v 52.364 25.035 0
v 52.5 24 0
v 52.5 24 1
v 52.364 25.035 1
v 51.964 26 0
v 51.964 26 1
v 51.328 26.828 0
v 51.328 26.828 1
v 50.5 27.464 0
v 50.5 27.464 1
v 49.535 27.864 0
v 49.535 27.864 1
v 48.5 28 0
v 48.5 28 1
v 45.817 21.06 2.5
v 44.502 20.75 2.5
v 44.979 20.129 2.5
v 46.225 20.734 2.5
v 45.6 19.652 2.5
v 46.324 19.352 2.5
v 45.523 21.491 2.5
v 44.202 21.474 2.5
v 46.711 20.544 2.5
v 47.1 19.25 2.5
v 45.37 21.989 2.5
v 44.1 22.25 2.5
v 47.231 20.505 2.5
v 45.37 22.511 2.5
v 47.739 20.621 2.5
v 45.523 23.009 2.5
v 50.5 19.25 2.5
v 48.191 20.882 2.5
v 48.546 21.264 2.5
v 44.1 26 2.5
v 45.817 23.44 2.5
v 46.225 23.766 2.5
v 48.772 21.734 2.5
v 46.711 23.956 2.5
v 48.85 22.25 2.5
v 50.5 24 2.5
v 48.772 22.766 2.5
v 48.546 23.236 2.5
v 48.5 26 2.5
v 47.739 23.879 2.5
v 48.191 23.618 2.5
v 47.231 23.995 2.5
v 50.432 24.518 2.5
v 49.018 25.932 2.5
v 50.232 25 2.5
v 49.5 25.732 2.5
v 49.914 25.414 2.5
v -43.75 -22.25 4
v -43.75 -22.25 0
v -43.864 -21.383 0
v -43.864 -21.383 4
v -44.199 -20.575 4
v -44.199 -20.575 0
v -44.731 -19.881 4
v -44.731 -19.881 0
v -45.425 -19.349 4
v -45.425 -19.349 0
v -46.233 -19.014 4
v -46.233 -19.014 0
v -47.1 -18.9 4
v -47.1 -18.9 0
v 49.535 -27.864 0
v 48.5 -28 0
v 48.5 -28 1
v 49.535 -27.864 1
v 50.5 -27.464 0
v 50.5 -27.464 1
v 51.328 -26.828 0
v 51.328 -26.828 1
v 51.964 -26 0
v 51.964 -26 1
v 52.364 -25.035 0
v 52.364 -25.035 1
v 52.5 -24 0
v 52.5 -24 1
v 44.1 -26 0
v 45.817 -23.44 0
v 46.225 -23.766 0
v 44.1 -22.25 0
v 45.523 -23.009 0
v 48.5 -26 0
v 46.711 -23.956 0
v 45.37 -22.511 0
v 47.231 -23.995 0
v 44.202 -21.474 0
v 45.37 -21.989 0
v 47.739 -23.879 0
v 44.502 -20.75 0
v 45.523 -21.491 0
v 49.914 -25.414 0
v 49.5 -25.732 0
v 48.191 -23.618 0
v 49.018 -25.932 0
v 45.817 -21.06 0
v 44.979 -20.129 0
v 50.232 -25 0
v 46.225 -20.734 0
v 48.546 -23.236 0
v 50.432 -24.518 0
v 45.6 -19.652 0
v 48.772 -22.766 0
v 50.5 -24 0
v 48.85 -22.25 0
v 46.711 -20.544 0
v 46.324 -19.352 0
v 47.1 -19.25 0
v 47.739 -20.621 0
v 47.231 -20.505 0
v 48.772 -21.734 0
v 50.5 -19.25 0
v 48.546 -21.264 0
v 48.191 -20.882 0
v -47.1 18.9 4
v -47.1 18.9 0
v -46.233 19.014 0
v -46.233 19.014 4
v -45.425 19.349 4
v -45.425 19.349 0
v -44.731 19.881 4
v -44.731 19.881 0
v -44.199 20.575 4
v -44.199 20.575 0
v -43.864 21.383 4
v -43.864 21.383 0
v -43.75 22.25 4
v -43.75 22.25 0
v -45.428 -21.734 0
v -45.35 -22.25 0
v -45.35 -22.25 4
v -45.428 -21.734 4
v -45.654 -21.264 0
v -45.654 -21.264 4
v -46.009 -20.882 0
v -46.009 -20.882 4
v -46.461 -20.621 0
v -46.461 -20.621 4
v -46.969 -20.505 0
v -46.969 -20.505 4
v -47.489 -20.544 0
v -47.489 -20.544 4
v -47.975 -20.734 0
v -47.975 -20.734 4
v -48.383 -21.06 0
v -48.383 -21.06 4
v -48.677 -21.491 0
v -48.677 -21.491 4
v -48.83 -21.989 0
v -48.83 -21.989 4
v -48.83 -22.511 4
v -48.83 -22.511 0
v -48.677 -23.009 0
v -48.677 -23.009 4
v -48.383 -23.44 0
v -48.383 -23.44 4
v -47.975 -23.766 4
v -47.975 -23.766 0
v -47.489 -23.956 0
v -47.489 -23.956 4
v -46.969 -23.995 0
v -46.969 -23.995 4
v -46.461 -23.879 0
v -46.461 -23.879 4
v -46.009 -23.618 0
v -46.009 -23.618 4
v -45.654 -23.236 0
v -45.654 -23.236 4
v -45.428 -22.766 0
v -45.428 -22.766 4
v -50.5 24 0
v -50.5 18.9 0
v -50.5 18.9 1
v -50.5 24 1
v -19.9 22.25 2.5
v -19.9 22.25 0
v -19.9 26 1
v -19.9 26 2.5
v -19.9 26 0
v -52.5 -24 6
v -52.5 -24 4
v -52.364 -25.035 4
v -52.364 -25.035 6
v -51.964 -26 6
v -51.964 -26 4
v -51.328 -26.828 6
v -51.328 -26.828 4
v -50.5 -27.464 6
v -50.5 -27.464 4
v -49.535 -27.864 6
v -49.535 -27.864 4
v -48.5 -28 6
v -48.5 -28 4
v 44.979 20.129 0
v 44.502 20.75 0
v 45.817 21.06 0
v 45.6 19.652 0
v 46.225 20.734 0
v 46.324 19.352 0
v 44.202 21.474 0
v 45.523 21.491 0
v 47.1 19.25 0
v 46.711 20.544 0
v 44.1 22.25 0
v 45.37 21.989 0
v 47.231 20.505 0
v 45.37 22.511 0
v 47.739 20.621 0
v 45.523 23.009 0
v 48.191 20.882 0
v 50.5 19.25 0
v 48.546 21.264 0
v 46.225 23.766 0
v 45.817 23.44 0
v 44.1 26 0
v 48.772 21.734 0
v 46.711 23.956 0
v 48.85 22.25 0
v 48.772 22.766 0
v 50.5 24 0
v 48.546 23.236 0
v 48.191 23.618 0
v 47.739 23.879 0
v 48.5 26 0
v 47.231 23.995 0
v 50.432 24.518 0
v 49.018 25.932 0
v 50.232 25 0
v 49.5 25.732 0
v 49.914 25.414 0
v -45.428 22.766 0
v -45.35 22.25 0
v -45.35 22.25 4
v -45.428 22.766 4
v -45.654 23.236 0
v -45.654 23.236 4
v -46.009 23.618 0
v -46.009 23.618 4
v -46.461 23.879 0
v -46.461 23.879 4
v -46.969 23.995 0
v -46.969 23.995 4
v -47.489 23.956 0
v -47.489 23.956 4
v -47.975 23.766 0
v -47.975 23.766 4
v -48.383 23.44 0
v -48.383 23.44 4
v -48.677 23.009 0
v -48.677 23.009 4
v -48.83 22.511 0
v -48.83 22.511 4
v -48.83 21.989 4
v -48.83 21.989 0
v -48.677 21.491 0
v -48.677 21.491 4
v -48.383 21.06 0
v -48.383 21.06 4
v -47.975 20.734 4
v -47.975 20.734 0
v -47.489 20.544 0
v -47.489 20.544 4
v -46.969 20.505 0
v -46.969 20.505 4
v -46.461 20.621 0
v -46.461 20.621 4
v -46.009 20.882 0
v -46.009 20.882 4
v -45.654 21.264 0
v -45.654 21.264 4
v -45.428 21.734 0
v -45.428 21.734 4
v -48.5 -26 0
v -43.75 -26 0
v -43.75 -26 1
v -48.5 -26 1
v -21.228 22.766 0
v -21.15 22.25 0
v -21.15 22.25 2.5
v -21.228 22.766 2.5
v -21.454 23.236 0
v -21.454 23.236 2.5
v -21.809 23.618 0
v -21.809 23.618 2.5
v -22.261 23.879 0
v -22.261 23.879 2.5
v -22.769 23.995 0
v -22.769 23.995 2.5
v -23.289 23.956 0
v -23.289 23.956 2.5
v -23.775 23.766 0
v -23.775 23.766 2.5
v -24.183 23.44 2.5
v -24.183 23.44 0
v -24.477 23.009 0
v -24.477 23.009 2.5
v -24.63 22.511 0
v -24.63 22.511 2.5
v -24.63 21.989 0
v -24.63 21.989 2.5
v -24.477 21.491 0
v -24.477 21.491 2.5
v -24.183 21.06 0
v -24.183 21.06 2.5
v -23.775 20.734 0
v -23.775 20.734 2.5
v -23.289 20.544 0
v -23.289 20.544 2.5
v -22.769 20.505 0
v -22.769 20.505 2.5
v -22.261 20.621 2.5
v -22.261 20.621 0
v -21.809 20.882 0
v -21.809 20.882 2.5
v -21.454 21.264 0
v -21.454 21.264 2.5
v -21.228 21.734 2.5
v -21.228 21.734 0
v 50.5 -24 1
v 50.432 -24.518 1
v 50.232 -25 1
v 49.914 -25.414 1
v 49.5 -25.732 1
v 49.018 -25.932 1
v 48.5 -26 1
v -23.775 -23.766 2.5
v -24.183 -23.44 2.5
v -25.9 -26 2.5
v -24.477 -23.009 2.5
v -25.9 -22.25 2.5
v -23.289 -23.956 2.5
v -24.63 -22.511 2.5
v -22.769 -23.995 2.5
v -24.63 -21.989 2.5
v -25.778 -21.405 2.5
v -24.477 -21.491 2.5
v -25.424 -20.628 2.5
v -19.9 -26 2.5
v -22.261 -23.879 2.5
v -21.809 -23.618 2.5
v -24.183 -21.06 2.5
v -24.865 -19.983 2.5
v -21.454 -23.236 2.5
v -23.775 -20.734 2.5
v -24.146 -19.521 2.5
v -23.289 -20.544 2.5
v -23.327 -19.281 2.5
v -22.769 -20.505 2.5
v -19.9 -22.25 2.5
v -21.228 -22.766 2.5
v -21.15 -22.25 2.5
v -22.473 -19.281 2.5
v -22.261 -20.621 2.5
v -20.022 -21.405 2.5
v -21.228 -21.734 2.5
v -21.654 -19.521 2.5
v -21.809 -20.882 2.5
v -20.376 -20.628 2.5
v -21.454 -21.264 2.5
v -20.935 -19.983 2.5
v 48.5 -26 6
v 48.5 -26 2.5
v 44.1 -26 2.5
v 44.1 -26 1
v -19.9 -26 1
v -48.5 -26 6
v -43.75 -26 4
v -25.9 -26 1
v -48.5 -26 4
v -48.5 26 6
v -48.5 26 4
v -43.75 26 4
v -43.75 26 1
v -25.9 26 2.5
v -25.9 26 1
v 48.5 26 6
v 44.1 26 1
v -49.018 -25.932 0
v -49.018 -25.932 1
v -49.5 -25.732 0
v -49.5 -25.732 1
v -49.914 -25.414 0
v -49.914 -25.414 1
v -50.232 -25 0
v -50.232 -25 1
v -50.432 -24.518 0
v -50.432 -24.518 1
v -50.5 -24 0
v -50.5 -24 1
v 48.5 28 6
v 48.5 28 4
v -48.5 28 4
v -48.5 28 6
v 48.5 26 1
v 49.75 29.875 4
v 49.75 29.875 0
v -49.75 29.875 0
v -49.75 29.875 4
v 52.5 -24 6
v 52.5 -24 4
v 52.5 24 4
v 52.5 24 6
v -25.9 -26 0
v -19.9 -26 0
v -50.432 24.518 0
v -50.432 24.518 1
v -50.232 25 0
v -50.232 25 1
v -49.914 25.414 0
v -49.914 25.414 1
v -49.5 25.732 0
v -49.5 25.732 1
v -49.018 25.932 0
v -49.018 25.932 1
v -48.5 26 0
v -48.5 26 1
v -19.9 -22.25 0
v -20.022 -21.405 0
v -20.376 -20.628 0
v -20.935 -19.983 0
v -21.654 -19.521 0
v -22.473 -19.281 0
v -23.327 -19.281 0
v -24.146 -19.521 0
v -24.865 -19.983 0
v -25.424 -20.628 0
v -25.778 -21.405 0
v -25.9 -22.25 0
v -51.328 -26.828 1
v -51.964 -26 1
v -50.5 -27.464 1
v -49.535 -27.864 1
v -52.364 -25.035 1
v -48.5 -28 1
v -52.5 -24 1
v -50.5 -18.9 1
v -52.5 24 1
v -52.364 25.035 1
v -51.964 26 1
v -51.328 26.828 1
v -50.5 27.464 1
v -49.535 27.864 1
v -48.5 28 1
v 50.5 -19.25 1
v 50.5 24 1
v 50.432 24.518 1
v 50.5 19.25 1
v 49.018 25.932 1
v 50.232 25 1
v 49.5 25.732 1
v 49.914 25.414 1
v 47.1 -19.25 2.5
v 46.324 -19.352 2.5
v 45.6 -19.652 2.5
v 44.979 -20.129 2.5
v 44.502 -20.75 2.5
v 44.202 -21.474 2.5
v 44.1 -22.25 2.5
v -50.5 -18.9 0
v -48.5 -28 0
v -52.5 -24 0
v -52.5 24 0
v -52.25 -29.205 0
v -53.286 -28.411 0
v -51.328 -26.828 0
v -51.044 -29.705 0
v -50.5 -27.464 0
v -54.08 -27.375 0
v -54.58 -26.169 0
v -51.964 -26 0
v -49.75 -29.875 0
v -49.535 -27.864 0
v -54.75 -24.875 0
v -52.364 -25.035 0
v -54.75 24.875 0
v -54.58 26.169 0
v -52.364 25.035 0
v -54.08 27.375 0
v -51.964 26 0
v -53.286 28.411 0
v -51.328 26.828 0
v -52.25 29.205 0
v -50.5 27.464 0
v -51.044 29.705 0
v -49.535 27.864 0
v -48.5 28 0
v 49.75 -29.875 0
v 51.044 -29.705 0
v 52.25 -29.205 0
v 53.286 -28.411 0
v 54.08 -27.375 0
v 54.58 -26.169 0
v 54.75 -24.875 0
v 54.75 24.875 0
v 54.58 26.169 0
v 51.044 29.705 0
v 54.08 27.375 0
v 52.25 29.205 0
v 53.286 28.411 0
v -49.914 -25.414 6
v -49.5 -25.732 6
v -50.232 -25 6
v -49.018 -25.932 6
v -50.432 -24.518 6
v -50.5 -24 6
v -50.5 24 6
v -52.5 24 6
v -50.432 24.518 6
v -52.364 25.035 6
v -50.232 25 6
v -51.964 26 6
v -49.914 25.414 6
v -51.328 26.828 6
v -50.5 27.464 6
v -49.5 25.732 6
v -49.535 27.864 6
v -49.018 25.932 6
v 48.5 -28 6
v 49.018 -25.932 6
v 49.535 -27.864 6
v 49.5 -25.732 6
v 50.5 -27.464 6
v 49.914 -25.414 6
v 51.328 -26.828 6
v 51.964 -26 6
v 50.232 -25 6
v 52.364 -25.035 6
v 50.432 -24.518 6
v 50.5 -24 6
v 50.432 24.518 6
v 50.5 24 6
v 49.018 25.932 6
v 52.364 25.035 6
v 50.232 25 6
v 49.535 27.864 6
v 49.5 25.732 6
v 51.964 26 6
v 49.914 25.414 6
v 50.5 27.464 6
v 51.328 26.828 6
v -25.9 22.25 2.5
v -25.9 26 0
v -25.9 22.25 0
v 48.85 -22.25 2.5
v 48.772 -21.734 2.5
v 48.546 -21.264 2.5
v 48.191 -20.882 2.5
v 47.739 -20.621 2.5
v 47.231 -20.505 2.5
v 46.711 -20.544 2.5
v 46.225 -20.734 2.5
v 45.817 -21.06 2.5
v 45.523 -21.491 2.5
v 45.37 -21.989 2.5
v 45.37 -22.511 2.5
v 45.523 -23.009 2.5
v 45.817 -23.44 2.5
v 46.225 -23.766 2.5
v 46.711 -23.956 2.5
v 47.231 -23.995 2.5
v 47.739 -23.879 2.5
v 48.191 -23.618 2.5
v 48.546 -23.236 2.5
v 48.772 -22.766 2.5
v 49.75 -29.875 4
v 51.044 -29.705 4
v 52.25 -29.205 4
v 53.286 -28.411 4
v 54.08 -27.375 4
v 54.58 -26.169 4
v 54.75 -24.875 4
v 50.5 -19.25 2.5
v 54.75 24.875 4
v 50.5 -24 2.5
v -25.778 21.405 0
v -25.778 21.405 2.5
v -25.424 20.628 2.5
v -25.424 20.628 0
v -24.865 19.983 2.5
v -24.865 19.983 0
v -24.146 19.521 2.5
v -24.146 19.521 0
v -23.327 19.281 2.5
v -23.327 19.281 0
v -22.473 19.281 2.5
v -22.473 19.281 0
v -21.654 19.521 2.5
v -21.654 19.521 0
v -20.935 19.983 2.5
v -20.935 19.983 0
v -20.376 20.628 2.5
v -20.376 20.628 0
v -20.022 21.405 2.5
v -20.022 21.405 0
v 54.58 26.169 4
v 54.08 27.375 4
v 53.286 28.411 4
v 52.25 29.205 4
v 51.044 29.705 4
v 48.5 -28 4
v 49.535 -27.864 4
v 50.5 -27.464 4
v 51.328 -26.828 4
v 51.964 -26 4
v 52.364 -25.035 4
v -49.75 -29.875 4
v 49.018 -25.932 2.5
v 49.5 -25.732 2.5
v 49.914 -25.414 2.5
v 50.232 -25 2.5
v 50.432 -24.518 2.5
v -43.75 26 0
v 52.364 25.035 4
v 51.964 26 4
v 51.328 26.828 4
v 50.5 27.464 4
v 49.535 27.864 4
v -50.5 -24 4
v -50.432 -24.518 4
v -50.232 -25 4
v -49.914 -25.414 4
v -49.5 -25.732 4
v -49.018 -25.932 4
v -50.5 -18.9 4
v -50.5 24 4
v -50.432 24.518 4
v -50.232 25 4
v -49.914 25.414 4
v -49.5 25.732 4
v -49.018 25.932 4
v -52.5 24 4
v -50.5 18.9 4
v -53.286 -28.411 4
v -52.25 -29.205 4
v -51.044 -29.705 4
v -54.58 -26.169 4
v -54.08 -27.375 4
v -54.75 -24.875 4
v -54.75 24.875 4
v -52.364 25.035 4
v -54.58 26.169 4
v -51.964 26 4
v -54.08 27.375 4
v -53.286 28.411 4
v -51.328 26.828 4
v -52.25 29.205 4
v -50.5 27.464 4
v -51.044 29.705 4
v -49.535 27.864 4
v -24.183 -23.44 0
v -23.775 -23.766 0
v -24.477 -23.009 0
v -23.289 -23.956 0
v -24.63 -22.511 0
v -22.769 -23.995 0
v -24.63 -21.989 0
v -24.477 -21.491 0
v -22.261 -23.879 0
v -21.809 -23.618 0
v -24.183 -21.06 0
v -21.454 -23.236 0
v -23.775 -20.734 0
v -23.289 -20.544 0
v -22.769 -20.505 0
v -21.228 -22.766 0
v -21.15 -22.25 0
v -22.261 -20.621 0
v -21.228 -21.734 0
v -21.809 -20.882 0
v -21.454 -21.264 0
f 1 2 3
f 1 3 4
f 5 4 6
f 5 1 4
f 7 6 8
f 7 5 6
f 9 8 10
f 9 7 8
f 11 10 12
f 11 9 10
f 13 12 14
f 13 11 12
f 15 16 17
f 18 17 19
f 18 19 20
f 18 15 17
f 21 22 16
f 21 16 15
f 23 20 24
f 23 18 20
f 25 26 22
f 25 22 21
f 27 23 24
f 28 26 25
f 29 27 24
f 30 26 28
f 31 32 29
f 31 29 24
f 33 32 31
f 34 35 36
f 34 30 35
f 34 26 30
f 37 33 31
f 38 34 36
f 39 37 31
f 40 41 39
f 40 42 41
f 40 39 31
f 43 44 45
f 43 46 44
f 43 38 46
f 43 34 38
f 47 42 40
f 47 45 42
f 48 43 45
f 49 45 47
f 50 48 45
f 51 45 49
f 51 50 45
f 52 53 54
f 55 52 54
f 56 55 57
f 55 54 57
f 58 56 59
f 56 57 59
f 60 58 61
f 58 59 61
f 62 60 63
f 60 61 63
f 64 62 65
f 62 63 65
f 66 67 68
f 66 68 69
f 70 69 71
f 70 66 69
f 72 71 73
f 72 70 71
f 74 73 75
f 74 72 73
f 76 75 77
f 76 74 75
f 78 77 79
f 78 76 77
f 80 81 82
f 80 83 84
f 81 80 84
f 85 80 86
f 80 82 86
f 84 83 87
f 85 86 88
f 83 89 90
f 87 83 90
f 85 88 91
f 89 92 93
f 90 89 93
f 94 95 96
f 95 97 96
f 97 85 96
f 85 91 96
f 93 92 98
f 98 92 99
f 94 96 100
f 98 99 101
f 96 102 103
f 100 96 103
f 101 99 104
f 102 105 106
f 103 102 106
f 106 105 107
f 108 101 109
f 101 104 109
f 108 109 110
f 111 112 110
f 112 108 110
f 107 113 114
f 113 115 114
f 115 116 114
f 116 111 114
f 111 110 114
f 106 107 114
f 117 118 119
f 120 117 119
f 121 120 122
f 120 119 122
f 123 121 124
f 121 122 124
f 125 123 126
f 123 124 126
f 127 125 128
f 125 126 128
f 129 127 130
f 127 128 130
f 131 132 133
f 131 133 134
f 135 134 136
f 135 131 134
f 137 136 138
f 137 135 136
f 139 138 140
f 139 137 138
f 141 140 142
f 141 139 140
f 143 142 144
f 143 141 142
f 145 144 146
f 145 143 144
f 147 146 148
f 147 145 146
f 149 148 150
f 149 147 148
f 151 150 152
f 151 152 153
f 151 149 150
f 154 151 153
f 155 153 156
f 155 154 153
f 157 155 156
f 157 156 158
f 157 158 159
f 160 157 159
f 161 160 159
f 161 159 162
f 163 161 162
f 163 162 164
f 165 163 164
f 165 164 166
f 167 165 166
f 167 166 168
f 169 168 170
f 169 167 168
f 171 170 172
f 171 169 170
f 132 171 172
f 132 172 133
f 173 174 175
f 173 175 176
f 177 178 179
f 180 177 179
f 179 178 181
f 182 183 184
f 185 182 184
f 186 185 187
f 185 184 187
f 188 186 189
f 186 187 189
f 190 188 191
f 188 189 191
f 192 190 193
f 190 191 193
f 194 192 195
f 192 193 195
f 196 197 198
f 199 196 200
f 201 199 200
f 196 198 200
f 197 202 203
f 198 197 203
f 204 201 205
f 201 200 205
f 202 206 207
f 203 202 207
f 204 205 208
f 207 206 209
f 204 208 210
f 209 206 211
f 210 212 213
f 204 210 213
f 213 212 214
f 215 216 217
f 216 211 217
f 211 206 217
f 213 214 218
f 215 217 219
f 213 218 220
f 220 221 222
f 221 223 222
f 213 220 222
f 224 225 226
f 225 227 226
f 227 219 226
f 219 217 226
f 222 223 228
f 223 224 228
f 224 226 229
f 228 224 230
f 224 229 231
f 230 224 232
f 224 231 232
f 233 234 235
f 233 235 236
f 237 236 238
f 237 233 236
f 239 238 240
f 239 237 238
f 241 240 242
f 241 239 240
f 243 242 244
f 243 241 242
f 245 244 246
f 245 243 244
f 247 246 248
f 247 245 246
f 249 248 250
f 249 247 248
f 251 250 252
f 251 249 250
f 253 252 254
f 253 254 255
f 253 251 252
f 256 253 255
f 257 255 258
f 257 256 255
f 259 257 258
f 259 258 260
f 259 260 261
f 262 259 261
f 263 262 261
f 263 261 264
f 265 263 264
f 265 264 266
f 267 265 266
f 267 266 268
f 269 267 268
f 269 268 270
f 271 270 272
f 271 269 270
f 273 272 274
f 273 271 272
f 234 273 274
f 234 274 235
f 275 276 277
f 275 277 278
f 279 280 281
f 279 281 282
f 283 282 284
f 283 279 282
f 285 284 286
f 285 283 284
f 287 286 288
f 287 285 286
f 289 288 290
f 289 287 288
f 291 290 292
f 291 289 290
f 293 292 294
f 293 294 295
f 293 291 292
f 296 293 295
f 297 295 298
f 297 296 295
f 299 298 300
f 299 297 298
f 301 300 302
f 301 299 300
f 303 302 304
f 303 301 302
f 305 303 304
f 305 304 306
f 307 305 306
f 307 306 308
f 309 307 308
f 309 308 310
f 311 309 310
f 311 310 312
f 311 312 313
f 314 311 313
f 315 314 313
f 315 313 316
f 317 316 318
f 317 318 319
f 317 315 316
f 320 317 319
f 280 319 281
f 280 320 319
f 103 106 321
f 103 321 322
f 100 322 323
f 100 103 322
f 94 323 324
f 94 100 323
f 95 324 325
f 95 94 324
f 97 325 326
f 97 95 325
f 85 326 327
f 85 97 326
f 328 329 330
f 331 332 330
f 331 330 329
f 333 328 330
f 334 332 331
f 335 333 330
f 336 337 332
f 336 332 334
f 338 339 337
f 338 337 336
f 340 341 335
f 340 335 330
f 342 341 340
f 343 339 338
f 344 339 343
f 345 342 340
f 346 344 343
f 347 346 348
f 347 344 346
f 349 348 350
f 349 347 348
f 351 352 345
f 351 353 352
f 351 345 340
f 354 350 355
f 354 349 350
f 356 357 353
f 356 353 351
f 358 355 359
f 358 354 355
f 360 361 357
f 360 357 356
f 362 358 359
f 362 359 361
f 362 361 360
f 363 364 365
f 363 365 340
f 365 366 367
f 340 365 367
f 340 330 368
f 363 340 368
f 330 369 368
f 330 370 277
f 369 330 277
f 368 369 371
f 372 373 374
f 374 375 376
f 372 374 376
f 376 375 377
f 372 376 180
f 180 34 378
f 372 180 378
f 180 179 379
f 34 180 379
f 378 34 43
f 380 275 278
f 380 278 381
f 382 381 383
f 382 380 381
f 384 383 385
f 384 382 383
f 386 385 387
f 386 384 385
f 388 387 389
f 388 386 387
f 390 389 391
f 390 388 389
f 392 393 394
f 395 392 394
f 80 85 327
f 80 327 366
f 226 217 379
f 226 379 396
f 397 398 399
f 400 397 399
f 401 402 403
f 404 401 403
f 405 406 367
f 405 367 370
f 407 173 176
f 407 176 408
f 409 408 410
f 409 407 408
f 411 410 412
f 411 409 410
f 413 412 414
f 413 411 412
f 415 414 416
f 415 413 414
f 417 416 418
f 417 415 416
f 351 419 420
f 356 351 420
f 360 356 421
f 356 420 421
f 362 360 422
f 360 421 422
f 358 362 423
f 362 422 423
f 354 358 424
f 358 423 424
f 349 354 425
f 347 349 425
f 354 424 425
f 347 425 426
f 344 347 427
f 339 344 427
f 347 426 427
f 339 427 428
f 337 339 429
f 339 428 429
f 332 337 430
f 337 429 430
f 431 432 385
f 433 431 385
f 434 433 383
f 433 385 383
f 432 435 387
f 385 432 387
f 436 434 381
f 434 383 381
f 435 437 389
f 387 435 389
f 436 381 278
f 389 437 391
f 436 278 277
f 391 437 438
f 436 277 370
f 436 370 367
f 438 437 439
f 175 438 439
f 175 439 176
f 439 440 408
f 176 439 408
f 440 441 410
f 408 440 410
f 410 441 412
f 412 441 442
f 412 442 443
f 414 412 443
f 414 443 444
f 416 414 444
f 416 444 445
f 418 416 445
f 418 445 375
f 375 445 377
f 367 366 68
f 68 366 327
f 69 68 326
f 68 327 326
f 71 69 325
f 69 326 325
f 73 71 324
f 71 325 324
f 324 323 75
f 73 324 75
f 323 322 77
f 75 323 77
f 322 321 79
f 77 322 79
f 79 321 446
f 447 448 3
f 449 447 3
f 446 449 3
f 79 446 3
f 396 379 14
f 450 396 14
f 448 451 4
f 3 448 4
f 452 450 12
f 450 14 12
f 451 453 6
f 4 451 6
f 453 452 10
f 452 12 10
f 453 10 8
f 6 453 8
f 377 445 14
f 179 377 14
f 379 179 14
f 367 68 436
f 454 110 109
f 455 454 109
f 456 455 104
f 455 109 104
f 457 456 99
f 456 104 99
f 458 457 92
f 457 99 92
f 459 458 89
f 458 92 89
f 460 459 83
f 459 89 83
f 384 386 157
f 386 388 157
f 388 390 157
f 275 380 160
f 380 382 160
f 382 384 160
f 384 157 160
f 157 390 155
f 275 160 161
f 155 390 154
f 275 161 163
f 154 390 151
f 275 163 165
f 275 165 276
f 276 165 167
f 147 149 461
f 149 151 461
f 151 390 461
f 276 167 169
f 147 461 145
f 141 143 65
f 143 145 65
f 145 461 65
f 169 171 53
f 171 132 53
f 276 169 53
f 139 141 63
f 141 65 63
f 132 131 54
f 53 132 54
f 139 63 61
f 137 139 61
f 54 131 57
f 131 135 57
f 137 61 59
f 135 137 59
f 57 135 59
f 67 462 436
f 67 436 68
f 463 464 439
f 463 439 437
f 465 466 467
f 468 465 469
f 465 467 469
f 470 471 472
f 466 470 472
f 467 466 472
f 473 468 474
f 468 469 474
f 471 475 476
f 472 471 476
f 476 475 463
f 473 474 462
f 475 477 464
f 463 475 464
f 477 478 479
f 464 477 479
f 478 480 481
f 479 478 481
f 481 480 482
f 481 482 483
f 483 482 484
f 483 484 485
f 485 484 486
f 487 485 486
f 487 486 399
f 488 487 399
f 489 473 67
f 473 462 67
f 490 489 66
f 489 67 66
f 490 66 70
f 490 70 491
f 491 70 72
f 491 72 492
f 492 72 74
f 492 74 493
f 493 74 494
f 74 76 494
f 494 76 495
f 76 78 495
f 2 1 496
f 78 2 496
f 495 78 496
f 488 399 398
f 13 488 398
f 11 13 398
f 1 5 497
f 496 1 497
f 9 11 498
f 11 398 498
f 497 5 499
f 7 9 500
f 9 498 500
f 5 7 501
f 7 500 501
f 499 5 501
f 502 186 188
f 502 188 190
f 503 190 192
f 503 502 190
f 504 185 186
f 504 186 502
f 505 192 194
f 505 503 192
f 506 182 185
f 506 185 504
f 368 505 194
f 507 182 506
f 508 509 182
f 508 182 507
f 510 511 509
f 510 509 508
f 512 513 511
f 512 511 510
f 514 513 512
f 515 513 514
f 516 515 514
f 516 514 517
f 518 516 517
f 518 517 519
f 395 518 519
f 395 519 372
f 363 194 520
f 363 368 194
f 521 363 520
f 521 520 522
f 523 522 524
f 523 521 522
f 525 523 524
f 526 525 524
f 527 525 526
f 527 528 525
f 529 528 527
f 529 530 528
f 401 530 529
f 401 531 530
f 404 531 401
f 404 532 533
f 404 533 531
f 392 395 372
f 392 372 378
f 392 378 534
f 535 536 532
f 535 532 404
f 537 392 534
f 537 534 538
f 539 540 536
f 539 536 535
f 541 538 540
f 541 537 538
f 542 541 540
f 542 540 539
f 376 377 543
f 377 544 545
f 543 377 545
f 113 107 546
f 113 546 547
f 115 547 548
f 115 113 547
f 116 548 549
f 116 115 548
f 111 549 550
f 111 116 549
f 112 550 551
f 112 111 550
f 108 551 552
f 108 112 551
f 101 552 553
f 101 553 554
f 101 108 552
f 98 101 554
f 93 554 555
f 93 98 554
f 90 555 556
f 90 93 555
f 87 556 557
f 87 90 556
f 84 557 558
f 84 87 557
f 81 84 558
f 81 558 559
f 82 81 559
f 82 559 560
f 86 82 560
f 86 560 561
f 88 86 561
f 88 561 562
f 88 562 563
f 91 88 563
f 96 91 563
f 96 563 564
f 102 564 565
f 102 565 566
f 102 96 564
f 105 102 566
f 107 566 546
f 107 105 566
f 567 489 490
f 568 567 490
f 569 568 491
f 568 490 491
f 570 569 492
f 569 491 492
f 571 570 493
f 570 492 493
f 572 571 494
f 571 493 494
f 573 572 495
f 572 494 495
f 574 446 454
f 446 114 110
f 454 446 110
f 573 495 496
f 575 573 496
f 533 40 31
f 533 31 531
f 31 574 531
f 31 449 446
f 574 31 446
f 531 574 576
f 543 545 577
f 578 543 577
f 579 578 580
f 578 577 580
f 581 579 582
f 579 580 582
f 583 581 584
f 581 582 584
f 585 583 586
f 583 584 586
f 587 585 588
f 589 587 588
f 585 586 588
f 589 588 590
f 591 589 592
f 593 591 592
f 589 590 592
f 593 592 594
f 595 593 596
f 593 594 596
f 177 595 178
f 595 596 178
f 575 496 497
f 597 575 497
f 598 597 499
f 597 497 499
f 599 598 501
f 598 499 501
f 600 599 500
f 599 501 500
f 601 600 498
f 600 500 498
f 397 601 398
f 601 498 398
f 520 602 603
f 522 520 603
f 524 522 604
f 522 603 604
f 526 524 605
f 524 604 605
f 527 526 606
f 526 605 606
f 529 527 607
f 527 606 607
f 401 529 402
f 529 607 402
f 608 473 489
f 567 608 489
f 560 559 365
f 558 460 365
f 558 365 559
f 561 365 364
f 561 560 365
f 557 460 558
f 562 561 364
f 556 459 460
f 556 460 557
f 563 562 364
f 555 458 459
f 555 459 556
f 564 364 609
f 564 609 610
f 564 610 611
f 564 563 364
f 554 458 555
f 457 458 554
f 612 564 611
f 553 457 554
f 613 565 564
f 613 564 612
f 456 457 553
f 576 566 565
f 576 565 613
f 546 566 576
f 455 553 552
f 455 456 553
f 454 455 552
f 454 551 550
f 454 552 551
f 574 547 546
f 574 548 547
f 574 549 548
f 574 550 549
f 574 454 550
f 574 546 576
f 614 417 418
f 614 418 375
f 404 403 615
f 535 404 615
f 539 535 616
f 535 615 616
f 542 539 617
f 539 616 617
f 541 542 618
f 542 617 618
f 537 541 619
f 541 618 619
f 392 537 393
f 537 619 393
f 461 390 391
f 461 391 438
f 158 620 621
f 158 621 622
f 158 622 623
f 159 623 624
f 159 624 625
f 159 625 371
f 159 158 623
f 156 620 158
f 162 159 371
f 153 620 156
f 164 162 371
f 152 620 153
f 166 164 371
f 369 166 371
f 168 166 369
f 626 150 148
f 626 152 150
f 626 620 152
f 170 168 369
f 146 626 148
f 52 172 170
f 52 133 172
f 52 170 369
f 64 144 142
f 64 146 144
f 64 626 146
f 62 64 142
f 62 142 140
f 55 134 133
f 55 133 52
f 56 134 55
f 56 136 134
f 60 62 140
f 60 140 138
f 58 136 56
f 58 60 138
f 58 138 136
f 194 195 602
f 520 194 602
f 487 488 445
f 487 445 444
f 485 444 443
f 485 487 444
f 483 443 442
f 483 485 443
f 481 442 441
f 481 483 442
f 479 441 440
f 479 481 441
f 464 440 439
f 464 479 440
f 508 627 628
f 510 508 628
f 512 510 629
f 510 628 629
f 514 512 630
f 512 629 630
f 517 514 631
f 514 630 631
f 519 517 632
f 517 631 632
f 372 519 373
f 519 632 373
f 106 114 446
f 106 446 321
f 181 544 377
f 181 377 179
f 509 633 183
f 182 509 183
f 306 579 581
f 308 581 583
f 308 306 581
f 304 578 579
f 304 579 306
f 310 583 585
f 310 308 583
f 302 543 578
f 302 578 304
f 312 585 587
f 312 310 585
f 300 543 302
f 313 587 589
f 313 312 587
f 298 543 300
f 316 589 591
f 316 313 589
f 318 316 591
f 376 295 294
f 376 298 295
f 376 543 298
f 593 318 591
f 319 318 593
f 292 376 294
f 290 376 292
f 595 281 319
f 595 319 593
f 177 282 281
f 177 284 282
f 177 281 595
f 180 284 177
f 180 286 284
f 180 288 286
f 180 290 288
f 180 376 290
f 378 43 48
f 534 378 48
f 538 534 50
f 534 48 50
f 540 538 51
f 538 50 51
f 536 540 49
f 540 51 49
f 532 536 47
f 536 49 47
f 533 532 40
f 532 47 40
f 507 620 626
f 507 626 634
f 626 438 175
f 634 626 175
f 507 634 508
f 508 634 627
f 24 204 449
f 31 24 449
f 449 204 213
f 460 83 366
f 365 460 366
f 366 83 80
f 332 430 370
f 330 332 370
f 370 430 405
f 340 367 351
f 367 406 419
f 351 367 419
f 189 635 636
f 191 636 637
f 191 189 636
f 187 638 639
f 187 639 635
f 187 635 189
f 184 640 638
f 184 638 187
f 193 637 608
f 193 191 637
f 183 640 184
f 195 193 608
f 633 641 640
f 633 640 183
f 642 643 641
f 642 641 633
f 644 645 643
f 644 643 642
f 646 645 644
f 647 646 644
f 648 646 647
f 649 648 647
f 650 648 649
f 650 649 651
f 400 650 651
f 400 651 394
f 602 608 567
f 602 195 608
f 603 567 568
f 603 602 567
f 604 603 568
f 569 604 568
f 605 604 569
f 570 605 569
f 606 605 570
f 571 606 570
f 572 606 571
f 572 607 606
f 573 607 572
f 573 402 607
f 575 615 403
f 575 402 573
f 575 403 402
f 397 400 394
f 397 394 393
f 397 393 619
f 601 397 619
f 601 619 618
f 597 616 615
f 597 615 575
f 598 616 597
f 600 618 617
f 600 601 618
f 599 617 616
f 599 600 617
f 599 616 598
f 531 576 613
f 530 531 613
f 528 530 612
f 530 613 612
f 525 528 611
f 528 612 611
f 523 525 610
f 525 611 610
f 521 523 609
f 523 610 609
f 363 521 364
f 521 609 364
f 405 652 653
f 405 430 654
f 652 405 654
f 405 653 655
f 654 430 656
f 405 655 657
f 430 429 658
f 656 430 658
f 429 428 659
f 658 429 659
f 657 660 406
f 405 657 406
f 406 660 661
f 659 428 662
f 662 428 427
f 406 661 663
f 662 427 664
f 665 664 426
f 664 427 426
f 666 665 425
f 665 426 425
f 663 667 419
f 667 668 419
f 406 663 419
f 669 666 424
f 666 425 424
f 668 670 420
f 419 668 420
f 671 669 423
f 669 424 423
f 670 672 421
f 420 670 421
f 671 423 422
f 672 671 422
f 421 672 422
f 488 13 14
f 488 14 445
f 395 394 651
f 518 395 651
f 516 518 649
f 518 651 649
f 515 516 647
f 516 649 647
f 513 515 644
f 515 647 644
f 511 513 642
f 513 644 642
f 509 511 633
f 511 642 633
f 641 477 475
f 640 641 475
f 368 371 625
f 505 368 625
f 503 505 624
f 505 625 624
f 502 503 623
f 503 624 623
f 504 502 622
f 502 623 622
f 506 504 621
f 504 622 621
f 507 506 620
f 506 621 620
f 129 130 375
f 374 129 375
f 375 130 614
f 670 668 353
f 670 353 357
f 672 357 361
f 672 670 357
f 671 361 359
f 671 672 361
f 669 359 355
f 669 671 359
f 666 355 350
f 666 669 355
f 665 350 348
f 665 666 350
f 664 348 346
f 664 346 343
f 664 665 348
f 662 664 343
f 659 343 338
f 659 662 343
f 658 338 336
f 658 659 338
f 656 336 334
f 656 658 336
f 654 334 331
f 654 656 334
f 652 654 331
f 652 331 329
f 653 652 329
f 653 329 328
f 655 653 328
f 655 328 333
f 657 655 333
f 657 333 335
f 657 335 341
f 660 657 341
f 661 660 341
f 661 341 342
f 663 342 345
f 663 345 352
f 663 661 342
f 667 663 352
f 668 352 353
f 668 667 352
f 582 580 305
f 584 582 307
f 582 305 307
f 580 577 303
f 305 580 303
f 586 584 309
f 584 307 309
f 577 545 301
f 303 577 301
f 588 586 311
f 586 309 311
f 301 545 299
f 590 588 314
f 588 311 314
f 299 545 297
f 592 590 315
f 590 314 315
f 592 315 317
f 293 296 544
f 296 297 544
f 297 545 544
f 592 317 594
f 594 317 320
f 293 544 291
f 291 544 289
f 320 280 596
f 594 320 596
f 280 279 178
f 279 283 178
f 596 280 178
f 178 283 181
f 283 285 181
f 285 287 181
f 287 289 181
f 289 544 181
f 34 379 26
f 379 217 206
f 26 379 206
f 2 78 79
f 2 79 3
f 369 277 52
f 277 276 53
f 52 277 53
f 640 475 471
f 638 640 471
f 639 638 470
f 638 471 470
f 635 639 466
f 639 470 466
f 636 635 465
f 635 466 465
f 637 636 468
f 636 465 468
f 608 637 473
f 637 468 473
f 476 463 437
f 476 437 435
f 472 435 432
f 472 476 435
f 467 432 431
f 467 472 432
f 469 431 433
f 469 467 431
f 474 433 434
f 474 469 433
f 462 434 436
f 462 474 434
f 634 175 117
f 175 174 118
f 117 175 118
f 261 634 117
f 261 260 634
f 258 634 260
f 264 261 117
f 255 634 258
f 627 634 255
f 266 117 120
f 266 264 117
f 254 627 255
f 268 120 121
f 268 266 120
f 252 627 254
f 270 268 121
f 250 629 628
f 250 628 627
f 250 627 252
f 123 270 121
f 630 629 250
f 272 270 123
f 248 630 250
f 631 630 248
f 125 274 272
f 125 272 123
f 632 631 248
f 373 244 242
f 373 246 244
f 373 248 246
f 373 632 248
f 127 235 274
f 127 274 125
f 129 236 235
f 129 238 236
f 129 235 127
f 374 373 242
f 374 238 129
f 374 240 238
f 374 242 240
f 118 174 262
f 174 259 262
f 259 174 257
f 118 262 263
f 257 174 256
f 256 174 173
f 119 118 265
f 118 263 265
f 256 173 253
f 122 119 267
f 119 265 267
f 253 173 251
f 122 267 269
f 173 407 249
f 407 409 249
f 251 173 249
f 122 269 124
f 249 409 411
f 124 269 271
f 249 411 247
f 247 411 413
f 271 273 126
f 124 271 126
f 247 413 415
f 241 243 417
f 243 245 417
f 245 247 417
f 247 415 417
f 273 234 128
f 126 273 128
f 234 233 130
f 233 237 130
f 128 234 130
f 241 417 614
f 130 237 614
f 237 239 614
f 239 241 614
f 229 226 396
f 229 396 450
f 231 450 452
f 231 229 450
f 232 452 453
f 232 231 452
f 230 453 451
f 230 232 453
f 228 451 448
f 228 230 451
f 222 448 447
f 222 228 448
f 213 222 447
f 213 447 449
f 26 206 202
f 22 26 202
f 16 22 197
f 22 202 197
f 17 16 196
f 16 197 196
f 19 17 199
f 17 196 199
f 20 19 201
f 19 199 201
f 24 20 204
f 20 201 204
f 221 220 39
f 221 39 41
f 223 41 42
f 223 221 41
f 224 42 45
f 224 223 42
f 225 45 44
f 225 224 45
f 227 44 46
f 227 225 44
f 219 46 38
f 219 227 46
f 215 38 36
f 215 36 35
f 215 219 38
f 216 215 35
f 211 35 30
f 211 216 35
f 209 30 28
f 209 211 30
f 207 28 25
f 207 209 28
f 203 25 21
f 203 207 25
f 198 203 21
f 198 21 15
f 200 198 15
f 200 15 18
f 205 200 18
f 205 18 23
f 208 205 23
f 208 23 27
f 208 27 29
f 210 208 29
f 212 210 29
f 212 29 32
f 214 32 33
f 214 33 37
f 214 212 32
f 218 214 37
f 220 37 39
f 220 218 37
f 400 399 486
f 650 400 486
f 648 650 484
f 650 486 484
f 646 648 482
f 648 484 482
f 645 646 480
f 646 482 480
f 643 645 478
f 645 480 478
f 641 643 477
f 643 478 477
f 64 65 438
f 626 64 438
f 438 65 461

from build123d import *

# Parameters (mm, degrees)
F1_DEPTH = 6
F2_DEPTH = 4
F0_R     = 1.75
F3_DEPTH = 2.5
F4_DEPTH = 4
F5_DEPTH = 1


with BuildPart() as f1:
    # F0 (on Top) → F1 (new body)
    with BuildSketch(Plane.XY):
        with BuildLine():
            Line((48.5, 28), (-48.5, 28))
            ThreePointArc((-48.5, 28), (-51.328427, 26.828427), (-52.5, 24))
            Line((-52.5, 24), (-52.5, -24))
            ThreePointArc((-52.5, -24), (-51.328427, -26.828427), (-48.5, -28))
            Line((-48.5, -28), (48.5, -28))
            ThreePointArc((48.5, -28), (51.328427, -26.828427), (52.5, -24))
            Line((52.5, -24), (52.5, 24))
            ThreePointArc((52.5, 24), (51.328427, 26.828427), (48.5, 28))
        make_face()
        with BuildLine():
            ThreePointArc((-50.5, 24), (-49.914214, 25.414214), (-48.5, 26))
            Line((-48.5, 26), (-43.75, 26))
            Line((-43.75, 26), (-25.9, 26))
            Line((-25.9, 26), (-19.9, 26))
            Line((-19.9, 26), (44.1, 26))
            Line((44.1, 26), (48.5, 26))
            ThreePointArc((48.5, 26), (49.914214, 25.414214), (50.5, 24))
            Line((50.5, 24), (50.5, 19.25))
            Line((50.5, 19.25), (50.5, -19.25))
            Line((50.5, -19.25), (50.5, -24))
            ThreePointArc((50.5, -24), (49.914214, -25.414214), (48.5, -26))
            Line((48.5, -26), (44.1, -26))
            Line((44.1, -26), (-19.9, -26))
            Line((-19.9, -26), (-25.9, -26))
            Line((-25.9, -26), (-43.75, -26))
            Line((-43.75, -26), (-48.5, -26))
            ThreePointArc((-48.5, -26), (-49.914214, -25.414214), (-50.5, -24))
            Line((-50.5, -24), (-50.5, -18.9))
            Line((-50.5, -18.9), (-50.5, 18.9))
            Line((-50.5, 18.9), (-50.5, 24))
        make_face(mode=Mode.SUBTRACT)
    extrude(amount=F1_DEPTH)

    # F0 (on Top) → F2 (join)
    with BuildSketch(Plane.XY):
        with BuildLine():
            Line((49.75, 29.875), (-49.75, 29.875))
            ThreePointArc((-49.75, 29.875), (-53.285534, 28.410534), (-54.75, 24.875))
            Line((-54.75, 24.875), (-54.75, -24.875))
            ThreePointArc((-54.75, -24.875), (-53.285534, -28.410534), (-49.75, -29.875))
            Line((-49.75, -29.875), (49.75, -29.875))
            ThreePointArc((49.75, -29.875), (53.285534, -28.410534), (54.75, -24.875))
            Line((54.75, -24.875), (54.75, 24.875))
            ThreePointArc((54.75, 24.875), (53.285534, 28.410534), (49.75, 29.875))
        make_face()
        with BuildLine():
            ThreePointArc((-52.5, 24), (-51.328427, 26.828427), (-48.5, 28))
            Line((-48.5, 28), (48.5, 28))
            ThreePointArc((48.5, 28), (51.328427, 26.828427), (52.5, 24))
            Line((52.5, 24), (52.5, -24))
            ThreePointArc((52.5, -24), (51.328427, -26.828427), (48.5, -28))
            Line((48.5, -28), (-48.5, -28))
            ThreePointArc((-48.5, -28), (-51.328427, -26.828427), (-52.5, -24))
            Line((-52.5, -24), (-52.5, 24))
        make_face(mode=Mode.SUBTRACT)
    extrude(amount=F2_DEPTH)

    # F0 (on Top) → F3 (join)
    with BuildSketch(Plane.XY):
        with BuildLine():
            Line((-19.9, 26), (-25.9, 26))
            Line((-25.9, 26), (-25.9, 22.25))
            ThreePointArc((-25.9, 22.25), (-22.9, 19.25), (-19.9, 22.25))
            Line((-19.9, 22.25), (-19.9, 26))
        make_face()
        with Locations((-22.9, 22.25)):
            Circle(F0_R, mode=Mode.SUBTRACT)
        with BuildLine():
            Line((48.5, 26), (44.1, 26))
            Line((44.1, 26), (44.1, 22.25))
            ThreePointArc((44.1, 22.25), (44.97868, 20.12868), (47.1, 19.25))
            Line((47.1, 19.25), (50.5, 19.25))
            Line((50.5, 19.25), (50.5, 24))
            ThreePointArc((50.5, 24), (49.914214, 25.414214), (48.5, 26))
        make_face()
        with Locations((47.1, 22.25)):
            Circle(F0_R, mode=Mode.SUBTRACT)
        with BuildLine():
            Line((50.5, -24), (50.5, -19.25))
            Line((50.5, -19.25), (47.1, -19.25))
            ThreePointArc((47.1, -19.25), (44.97868, -20.12868), (44.1, -22.25))
            Line((44.1, -22.25), (44.1, -26))
            Line((44.1, -26), (48.5, -26))
            ThreePointArc((48.5, -26), (49.914214, -25.414214), (50.5, -24))
        make_face()
        with Locations((47.1, -22.25)):
            Circle(F0_R, mode=Mode.SUBTRACT)
        with BuildLine():
            Line((-25.9, -22.25), (-25.9, -26))
            Line((-25.9, -26), (-19.9, -26))
            Line((-19.9, -26), (-19.9, -22.25))
            ThreePointArc((-19.9, -22.25), (-22.9, -19.25), (-25.9, -22.25))
        make_face()
        with Locations((-22.9, -22.25)):
            Circle(F0_R, mode=Mode.SUBTRACT)
    extrude(amount=F3_DEPTH)

    # F0 (on Top) → F4 (join)
    with BuildSketch(Plane.XY):
        with BuildLine():
            Line((-43.75, 26), (-48.5, 26))
            ThreePointArc((-48.5, 26), (-49.914214, 25.414214), (-50.5, 24))
            Line((-50.5, 24), (-50.5, 18.9))
            Line((-50.5, 18.9), (-47.1, 18.9))
            ThreePointArc((-47.1, 18.9), (-44.731192, 19.881192), (-43.75, 22.25))
            Line((-43.75, 22.25), (-43.75, 26))
        make_face()
        with Locations((-47.1, 22.25)):
            Circle(F0_R, mode=Mode.SUBTRACT)
        with BuildLine():
            Line((-47.1, -18.9), (-50.5, -18.9))
            Line((-50.5, -18.9), (-50.5, -24))
            ThreePointArc((-50.5, -24), (-49.914214, -25.414214), (-48.5, -26))
            Line((-48.5, -26), (-43.75, -26))
            Line((-43.75, -26), (-43.75, -22.25))
            ThreePointArc((-43.75, -22.25), (-44.731192, -19.881192), (-47.1, -18.9))
        make_face()
        with Locations((-47.1, -22.25)):
            Circle(F0_R, mode=Mode.SUBTRACT)
    extrude(amount=F4_DEPTH)

    # F0 (on Top) → F5 (cut)
    with BuildSketch(Plane.XY):
        with BuildLine():
            Line((48.5, 28), (-48.5, 28))
            ThreePointArc((-48.5, 28), (-51.328427, 26.828427), (-52.5, 24))
            Line((-52.5, 24), (-52.5, -24))
            ThreePointArc((-52.5, -24), (-51.328427, -26.828427), (-48.5, -28))
            Line((-48.5, -28), (48.5, -28))
            ThreePointArc((48.5, -28), (51.328427, -26.828427), (52.5, -24))
            Line((52.5, -24), (52.5, 24))
            ThreePointArc((52.5, 24), (51.328427, 26.828427), (48.5, 28))
        make_face()
        with BuildLine():
            ThreePointArc((-50.5, 24), (-49.914214, 25.414214), (-48.5, 26))
            Line((-48.5, 26), (-43.75, 26))
            Line((-43.75, 26), (-25.9, 26))
            Line((-25.9, 26), (-19.9, 26))
            Line((-19.9, 26), (44.1, 26))
            Line((44.1, 26), (48.5, 26))
            ThreePointArc((48.5, 26), (49.914214, 25.414214), (50.5, 24))
            Line((50.5, 24), (50.5, 19.25))
            Line((50.5, 19.25), (50.5, -19.25))
            Line((50.5, -19.25), (50.5, -24))
            ThreePointArc((50.5, -24), (49.914214, -25.414214), (48.5, -26))
            Line((48.5, -26), (44.1, -26))
            Line((44.1, -26), (-19.9, -26))
            Line((-19.9, -26), (-25.9, -26))
            Line((-25.9, -26), (-43.75, -26))
            Line((-43.75, -26), (-48.5, -26))
            ThreePointArc((-48.5, -26), (-49.914214, -25.414214), (-50.5, -24))
            Line((-50.5, -24), (-50.5, -18.9))
            Line((-50.5, -18.9), (-50.5, 18.9))
            Line((-50.5, 18.9), (-50.5, 24))
        make_face(mode=Mode.SUBTRACT)
    extrude(amount=F5_DEPTH, mode=Mode.SUBTRACT)


solid = f1.part
